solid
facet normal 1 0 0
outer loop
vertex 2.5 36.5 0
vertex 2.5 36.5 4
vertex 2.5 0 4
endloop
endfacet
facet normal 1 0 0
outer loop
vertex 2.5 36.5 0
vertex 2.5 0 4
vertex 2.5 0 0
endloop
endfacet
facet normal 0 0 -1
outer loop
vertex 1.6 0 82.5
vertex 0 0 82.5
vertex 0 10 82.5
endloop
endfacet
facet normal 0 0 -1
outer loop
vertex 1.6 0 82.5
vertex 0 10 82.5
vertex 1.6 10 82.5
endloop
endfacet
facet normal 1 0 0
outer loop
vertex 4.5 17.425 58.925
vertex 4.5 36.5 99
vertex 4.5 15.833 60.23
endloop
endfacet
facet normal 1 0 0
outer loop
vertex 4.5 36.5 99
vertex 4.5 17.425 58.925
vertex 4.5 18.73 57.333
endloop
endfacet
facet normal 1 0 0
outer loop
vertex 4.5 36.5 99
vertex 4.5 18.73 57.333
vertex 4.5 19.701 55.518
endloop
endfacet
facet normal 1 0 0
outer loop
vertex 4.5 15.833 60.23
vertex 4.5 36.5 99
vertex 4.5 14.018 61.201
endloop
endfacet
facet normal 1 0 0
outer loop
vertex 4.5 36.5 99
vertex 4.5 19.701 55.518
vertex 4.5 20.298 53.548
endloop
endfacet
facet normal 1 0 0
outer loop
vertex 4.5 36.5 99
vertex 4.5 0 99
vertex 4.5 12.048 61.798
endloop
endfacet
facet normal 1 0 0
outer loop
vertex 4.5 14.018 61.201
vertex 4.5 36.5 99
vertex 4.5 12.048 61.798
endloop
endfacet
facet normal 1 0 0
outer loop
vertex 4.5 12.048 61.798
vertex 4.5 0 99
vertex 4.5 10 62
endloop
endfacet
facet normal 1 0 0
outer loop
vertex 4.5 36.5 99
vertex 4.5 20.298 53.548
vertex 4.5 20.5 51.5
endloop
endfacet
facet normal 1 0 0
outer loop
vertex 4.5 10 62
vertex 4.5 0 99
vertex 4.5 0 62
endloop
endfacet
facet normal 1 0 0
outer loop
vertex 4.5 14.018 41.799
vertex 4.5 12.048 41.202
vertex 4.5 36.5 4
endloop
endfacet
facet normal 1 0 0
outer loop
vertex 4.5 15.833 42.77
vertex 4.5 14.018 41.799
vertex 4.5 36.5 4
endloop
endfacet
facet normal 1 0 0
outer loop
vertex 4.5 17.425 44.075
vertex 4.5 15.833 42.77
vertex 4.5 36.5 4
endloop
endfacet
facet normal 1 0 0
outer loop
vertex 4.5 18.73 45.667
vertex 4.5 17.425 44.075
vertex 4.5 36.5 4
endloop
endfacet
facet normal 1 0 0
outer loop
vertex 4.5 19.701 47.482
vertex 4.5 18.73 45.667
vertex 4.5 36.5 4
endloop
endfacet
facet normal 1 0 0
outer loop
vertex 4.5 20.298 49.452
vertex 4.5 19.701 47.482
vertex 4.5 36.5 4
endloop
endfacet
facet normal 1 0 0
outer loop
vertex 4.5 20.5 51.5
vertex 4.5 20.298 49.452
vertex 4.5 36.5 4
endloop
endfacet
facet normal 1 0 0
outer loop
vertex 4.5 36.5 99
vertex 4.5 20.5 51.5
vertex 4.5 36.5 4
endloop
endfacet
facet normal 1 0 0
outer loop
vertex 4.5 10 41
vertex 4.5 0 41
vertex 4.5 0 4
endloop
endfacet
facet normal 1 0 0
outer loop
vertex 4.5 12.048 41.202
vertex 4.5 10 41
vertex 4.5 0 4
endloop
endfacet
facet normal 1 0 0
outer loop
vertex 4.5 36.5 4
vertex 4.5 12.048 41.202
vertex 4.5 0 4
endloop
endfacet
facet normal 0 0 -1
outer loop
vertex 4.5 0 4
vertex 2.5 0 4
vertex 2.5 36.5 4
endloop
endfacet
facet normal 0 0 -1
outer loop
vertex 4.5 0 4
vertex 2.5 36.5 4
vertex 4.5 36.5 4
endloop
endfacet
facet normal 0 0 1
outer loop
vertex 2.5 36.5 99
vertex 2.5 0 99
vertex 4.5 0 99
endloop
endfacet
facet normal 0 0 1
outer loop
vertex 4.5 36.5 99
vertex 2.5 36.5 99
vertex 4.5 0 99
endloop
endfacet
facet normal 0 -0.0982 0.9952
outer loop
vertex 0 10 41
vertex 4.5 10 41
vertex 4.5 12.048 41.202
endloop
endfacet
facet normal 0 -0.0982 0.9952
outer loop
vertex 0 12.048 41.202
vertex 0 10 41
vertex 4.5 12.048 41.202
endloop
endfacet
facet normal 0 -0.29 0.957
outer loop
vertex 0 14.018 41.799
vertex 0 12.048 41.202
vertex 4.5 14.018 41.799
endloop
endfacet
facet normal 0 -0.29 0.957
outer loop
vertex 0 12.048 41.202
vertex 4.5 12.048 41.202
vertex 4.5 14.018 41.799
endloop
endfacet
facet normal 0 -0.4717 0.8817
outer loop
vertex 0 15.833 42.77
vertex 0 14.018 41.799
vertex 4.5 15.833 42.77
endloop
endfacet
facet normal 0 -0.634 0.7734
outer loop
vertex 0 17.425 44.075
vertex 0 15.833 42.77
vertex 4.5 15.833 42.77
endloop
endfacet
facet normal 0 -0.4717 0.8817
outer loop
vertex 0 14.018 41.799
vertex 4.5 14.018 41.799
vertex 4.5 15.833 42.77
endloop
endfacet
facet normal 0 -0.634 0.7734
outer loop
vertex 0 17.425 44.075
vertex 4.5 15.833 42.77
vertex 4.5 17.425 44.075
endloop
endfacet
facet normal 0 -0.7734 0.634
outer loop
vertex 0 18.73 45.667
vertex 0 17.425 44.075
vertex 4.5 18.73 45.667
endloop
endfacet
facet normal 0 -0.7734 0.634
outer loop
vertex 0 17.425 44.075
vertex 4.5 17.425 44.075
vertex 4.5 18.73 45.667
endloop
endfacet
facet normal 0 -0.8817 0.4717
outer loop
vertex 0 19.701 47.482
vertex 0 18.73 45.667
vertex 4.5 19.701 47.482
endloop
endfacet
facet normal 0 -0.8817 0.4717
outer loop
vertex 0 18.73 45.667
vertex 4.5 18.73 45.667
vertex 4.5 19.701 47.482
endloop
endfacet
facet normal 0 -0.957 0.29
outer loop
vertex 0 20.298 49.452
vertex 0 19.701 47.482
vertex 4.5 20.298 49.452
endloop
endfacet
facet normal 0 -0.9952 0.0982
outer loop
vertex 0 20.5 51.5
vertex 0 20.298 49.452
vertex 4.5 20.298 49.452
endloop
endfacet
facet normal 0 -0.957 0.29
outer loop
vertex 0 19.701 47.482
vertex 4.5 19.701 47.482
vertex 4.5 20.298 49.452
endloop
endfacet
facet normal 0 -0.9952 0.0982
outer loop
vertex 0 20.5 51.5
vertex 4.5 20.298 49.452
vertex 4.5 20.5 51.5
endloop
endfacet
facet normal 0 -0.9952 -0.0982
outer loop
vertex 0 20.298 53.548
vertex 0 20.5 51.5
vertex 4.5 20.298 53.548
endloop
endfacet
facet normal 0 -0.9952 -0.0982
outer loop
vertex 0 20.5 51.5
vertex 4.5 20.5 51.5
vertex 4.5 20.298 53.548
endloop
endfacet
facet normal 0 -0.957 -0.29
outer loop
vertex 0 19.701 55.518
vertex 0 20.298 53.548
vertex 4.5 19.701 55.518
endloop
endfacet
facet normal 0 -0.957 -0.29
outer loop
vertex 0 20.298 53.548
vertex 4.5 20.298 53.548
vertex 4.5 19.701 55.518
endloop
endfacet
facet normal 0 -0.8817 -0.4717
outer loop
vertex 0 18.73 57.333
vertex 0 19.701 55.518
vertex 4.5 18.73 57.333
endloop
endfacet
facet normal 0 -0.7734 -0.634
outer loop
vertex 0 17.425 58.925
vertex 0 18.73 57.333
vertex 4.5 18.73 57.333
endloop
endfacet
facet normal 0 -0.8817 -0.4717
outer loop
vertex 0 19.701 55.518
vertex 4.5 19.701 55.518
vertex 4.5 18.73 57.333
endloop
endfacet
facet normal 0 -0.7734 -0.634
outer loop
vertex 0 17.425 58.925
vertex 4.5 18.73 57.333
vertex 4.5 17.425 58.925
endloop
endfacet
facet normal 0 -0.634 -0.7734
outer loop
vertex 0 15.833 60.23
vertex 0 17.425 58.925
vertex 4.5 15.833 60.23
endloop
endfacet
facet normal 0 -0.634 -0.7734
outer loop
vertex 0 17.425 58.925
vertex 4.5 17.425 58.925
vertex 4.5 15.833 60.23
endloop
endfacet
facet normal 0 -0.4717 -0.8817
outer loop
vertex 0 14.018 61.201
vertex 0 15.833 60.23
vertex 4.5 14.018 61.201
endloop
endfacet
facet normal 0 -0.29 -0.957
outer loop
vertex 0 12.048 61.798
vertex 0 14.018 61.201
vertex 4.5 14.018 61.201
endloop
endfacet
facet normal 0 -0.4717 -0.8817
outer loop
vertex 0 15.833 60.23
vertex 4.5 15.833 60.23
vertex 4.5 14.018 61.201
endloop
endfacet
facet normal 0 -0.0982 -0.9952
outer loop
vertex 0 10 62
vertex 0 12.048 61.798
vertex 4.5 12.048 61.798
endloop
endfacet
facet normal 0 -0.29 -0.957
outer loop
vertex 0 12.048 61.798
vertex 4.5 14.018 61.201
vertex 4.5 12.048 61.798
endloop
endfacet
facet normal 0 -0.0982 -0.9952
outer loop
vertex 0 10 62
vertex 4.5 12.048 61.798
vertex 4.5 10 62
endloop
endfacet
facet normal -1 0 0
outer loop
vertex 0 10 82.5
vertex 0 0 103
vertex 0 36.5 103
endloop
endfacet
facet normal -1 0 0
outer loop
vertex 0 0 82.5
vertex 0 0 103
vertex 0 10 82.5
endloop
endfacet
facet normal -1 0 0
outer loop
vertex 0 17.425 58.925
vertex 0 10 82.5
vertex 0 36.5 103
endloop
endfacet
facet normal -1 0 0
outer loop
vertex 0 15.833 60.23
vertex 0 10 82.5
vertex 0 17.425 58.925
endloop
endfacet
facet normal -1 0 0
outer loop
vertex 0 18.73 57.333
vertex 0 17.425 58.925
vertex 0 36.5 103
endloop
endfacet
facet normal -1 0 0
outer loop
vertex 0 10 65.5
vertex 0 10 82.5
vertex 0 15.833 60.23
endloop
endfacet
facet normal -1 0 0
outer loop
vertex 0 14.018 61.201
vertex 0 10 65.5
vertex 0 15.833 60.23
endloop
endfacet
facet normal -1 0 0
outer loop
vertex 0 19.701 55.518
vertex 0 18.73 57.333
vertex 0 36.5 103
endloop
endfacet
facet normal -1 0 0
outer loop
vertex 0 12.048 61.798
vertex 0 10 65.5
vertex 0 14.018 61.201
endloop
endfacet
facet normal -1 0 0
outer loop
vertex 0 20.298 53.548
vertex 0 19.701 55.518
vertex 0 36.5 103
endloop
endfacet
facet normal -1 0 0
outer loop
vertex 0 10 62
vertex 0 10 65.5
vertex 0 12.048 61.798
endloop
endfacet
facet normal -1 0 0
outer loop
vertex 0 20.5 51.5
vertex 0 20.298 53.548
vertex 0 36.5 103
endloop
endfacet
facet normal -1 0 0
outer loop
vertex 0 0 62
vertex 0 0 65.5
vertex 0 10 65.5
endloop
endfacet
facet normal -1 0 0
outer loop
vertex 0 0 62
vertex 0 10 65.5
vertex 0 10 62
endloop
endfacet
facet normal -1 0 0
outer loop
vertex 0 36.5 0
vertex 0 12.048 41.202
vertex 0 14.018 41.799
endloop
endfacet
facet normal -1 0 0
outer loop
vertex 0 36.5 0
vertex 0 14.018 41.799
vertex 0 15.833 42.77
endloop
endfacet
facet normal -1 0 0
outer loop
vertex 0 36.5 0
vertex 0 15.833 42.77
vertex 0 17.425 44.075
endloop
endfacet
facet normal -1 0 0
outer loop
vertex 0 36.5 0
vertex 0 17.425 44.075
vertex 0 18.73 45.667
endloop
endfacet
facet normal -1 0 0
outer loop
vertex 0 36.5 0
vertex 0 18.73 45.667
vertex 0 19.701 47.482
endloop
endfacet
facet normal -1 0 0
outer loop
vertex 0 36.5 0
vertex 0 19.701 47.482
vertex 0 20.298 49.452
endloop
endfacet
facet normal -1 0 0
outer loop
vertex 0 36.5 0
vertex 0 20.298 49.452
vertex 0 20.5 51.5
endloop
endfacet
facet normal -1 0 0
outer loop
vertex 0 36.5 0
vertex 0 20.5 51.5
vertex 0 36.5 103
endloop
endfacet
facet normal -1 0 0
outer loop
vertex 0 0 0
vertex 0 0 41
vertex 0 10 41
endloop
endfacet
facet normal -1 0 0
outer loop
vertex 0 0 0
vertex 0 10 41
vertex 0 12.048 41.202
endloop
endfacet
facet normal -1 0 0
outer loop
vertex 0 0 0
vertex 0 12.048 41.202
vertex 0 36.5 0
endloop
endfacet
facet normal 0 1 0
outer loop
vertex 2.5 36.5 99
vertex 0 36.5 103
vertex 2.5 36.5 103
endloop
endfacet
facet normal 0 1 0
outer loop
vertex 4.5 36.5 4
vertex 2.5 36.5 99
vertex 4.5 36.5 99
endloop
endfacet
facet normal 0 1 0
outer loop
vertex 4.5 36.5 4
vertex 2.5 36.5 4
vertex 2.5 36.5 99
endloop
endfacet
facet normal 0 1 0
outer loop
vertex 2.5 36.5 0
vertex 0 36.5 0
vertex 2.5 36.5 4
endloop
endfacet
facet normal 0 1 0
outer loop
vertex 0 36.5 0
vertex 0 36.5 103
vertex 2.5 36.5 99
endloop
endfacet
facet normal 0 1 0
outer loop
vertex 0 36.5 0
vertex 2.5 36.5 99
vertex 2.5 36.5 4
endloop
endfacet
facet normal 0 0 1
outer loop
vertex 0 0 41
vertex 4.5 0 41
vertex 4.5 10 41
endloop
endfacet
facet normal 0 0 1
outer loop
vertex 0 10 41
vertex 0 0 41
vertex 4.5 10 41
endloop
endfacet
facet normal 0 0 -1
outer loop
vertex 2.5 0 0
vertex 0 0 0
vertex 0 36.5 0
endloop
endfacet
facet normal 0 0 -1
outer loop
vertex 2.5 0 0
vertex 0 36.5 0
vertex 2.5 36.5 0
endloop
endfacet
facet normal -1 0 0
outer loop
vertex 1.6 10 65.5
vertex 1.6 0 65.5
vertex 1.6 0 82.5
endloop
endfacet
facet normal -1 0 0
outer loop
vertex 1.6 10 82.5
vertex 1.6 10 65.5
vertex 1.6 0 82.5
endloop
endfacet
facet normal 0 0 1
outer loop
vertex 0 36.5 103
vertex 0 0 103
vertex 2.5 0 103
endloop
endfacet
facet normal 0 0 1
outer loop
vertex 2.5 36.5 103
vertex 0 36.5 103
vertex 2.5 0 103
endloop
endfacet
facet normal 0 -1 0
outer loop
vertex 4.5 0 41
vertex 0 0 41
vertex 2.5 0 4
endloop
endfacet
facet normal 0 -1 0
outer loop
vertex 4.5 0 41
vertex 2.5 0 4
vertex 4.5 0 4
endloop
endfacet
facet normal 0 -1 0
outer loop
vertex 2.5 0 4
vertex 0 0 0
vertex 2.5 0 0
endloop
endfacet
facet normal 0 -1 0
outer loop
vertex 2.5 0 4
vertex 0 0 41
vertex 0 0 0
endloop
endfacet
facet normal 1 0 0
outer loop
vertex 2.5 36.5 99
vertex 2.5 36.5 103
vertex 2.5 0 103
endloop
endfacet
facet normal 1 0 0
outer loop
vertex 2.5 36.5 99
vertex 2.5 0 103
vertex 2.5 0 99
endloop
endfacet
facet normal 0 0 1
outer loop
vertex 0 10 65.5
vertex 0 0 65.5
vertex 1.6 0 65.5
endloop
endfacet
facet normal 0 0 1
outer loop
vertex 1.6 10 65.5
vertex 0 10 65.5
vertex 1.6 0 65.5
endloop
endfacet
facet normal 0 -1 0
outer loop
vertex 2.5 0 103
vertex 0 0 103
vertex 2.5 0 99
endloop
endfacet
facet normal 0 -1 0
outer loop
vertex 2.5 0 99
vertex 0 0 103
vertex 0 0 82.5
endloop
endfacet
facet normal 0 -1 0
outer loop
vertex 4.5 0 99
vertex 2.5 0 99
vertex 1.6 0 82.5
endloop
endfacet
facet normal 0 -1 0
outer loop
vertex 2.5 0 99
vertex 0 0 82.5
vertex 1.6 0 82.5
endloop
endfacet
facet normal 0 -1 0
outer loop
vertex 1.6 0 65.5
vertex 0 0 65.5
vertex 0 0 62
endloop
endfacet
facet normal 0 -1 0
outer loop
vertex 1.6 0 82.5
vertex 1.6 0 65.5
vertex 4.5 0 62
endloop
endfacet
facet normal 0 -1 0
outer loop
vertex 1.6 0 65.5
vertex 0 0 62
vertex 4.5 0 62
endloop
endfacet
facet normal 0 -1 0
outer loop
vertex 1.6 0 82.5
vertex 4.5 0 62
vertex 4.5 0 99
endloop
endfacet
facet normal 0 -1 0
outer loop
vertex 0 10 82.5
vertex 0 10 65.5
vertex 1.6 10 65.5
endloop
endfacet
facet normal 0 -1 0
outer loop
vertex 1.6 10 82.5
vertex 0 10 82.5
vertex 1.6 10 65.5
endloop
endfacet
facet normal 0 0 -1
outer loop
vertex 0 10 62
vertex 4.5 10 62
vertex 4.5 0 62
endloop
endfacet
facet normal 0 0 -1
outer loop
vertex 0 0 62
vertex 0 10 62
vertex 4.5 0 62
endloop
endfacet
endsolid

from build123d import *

# Parameters (mm, degrees)
SKETCH_1_W          = 2.5
SKETCH_1_H          = 103
SKETCH_1_W_2        = 2
SKETCH_1_H_2        = 95
EXTRUDE_1_DEPTH     = 99.5
CUT_EXTRUDE_2_DEPTH = 4.5
CUT_EXTRUDE_3_DEPTH = 58.5
CUT_EXTRUDE_4_DEPTH = 4.5
SKETCH_6_W          = 1.6
SKETCH_6_H          = 17
CUT_EXTRUDE_5_DEPTH = 10


with BuildPart() as part:
    # 스케치1 → 보스-돌출1 (new body)
    with BuildSketch(Plane(origin=(0, 0, 0), x_dir=(1, 0, 0), z_dir=(0, 1, 0))):
        with Locations((1.25, -51.5)):
            Rectangle(SKETCH_1_W, SKETCH_1_H)
        with Locations((3.5, -51.5)):
            Rectangle(SKETCH_1_W_2, SKETCH_1_H_2)
    extrude(amount=EXTRUDE_1_DEPTH)

    # 스케치2 → 컷-돌출2 (cut)
    with BuildSketch(Plane(origin=(4.5, 0, 0), x_dir=(0, 0, -1), z_dir=(1, 0, 0))):
        with BuildLine():
            Line((-62, 10), (-62, 0))
            Line((-62, 0), (-41, 0))
            Line((-41, 0), (-41, 10))
            ThreePointArc((-41, 10), (-51.5, 20.5), (-62, 10))
        make_face()
    extrude(amount=-CUT_EXTRUDE_2_DEPTH, mode=Mode.SUBTRACT)

    # 스케치3 → 컷-돌출3 (cut)
    with BuildSketch(Plane(origin=(0, 99.5, 0), x_dir=(1, 0, 0), z_dir=(0, 1, 0))):
        Polygon((2.5, -4), (2.5, 0), (0, 0), (0, -103), (2.5, -103), (2.5, -99), (4.5, -99), (4.5, -4), align=None)
    extrude(amount=-CUT_EXTRUDE_3_DEPTH, mode=Mode.SUBTRACT)

    # 스케치4 → 컷-돌출4 (cut)
    with BuildSketch(Plane(origin=(0, 41, 0), x_dir=(1, 0, 0), z_dir=(0, 1, 0))):
        Polygon((4.5, -4), (2.5, -4), (2.5, 0), (0, 0), (0, -103), (2.5, -103), (2.5, -99), (4.5, -99), align=None)
    extrude(amount=-CUT_EXTRUDE_4_DEPTH, mode=Mode.SUBTRACT)

    # 스케치6 → 컷-돌출5 (cut)
    with BuildSketch(Plane.XZ):
        with Locations((0.8, 74)):
            Rectangle(SKETCH_6_W, SKETCH_6_H)
    extrude(amount=-CUT_EXTRUDE_5_DEPTH, mode=Mode.SUBTRACT)


solid = part.part
